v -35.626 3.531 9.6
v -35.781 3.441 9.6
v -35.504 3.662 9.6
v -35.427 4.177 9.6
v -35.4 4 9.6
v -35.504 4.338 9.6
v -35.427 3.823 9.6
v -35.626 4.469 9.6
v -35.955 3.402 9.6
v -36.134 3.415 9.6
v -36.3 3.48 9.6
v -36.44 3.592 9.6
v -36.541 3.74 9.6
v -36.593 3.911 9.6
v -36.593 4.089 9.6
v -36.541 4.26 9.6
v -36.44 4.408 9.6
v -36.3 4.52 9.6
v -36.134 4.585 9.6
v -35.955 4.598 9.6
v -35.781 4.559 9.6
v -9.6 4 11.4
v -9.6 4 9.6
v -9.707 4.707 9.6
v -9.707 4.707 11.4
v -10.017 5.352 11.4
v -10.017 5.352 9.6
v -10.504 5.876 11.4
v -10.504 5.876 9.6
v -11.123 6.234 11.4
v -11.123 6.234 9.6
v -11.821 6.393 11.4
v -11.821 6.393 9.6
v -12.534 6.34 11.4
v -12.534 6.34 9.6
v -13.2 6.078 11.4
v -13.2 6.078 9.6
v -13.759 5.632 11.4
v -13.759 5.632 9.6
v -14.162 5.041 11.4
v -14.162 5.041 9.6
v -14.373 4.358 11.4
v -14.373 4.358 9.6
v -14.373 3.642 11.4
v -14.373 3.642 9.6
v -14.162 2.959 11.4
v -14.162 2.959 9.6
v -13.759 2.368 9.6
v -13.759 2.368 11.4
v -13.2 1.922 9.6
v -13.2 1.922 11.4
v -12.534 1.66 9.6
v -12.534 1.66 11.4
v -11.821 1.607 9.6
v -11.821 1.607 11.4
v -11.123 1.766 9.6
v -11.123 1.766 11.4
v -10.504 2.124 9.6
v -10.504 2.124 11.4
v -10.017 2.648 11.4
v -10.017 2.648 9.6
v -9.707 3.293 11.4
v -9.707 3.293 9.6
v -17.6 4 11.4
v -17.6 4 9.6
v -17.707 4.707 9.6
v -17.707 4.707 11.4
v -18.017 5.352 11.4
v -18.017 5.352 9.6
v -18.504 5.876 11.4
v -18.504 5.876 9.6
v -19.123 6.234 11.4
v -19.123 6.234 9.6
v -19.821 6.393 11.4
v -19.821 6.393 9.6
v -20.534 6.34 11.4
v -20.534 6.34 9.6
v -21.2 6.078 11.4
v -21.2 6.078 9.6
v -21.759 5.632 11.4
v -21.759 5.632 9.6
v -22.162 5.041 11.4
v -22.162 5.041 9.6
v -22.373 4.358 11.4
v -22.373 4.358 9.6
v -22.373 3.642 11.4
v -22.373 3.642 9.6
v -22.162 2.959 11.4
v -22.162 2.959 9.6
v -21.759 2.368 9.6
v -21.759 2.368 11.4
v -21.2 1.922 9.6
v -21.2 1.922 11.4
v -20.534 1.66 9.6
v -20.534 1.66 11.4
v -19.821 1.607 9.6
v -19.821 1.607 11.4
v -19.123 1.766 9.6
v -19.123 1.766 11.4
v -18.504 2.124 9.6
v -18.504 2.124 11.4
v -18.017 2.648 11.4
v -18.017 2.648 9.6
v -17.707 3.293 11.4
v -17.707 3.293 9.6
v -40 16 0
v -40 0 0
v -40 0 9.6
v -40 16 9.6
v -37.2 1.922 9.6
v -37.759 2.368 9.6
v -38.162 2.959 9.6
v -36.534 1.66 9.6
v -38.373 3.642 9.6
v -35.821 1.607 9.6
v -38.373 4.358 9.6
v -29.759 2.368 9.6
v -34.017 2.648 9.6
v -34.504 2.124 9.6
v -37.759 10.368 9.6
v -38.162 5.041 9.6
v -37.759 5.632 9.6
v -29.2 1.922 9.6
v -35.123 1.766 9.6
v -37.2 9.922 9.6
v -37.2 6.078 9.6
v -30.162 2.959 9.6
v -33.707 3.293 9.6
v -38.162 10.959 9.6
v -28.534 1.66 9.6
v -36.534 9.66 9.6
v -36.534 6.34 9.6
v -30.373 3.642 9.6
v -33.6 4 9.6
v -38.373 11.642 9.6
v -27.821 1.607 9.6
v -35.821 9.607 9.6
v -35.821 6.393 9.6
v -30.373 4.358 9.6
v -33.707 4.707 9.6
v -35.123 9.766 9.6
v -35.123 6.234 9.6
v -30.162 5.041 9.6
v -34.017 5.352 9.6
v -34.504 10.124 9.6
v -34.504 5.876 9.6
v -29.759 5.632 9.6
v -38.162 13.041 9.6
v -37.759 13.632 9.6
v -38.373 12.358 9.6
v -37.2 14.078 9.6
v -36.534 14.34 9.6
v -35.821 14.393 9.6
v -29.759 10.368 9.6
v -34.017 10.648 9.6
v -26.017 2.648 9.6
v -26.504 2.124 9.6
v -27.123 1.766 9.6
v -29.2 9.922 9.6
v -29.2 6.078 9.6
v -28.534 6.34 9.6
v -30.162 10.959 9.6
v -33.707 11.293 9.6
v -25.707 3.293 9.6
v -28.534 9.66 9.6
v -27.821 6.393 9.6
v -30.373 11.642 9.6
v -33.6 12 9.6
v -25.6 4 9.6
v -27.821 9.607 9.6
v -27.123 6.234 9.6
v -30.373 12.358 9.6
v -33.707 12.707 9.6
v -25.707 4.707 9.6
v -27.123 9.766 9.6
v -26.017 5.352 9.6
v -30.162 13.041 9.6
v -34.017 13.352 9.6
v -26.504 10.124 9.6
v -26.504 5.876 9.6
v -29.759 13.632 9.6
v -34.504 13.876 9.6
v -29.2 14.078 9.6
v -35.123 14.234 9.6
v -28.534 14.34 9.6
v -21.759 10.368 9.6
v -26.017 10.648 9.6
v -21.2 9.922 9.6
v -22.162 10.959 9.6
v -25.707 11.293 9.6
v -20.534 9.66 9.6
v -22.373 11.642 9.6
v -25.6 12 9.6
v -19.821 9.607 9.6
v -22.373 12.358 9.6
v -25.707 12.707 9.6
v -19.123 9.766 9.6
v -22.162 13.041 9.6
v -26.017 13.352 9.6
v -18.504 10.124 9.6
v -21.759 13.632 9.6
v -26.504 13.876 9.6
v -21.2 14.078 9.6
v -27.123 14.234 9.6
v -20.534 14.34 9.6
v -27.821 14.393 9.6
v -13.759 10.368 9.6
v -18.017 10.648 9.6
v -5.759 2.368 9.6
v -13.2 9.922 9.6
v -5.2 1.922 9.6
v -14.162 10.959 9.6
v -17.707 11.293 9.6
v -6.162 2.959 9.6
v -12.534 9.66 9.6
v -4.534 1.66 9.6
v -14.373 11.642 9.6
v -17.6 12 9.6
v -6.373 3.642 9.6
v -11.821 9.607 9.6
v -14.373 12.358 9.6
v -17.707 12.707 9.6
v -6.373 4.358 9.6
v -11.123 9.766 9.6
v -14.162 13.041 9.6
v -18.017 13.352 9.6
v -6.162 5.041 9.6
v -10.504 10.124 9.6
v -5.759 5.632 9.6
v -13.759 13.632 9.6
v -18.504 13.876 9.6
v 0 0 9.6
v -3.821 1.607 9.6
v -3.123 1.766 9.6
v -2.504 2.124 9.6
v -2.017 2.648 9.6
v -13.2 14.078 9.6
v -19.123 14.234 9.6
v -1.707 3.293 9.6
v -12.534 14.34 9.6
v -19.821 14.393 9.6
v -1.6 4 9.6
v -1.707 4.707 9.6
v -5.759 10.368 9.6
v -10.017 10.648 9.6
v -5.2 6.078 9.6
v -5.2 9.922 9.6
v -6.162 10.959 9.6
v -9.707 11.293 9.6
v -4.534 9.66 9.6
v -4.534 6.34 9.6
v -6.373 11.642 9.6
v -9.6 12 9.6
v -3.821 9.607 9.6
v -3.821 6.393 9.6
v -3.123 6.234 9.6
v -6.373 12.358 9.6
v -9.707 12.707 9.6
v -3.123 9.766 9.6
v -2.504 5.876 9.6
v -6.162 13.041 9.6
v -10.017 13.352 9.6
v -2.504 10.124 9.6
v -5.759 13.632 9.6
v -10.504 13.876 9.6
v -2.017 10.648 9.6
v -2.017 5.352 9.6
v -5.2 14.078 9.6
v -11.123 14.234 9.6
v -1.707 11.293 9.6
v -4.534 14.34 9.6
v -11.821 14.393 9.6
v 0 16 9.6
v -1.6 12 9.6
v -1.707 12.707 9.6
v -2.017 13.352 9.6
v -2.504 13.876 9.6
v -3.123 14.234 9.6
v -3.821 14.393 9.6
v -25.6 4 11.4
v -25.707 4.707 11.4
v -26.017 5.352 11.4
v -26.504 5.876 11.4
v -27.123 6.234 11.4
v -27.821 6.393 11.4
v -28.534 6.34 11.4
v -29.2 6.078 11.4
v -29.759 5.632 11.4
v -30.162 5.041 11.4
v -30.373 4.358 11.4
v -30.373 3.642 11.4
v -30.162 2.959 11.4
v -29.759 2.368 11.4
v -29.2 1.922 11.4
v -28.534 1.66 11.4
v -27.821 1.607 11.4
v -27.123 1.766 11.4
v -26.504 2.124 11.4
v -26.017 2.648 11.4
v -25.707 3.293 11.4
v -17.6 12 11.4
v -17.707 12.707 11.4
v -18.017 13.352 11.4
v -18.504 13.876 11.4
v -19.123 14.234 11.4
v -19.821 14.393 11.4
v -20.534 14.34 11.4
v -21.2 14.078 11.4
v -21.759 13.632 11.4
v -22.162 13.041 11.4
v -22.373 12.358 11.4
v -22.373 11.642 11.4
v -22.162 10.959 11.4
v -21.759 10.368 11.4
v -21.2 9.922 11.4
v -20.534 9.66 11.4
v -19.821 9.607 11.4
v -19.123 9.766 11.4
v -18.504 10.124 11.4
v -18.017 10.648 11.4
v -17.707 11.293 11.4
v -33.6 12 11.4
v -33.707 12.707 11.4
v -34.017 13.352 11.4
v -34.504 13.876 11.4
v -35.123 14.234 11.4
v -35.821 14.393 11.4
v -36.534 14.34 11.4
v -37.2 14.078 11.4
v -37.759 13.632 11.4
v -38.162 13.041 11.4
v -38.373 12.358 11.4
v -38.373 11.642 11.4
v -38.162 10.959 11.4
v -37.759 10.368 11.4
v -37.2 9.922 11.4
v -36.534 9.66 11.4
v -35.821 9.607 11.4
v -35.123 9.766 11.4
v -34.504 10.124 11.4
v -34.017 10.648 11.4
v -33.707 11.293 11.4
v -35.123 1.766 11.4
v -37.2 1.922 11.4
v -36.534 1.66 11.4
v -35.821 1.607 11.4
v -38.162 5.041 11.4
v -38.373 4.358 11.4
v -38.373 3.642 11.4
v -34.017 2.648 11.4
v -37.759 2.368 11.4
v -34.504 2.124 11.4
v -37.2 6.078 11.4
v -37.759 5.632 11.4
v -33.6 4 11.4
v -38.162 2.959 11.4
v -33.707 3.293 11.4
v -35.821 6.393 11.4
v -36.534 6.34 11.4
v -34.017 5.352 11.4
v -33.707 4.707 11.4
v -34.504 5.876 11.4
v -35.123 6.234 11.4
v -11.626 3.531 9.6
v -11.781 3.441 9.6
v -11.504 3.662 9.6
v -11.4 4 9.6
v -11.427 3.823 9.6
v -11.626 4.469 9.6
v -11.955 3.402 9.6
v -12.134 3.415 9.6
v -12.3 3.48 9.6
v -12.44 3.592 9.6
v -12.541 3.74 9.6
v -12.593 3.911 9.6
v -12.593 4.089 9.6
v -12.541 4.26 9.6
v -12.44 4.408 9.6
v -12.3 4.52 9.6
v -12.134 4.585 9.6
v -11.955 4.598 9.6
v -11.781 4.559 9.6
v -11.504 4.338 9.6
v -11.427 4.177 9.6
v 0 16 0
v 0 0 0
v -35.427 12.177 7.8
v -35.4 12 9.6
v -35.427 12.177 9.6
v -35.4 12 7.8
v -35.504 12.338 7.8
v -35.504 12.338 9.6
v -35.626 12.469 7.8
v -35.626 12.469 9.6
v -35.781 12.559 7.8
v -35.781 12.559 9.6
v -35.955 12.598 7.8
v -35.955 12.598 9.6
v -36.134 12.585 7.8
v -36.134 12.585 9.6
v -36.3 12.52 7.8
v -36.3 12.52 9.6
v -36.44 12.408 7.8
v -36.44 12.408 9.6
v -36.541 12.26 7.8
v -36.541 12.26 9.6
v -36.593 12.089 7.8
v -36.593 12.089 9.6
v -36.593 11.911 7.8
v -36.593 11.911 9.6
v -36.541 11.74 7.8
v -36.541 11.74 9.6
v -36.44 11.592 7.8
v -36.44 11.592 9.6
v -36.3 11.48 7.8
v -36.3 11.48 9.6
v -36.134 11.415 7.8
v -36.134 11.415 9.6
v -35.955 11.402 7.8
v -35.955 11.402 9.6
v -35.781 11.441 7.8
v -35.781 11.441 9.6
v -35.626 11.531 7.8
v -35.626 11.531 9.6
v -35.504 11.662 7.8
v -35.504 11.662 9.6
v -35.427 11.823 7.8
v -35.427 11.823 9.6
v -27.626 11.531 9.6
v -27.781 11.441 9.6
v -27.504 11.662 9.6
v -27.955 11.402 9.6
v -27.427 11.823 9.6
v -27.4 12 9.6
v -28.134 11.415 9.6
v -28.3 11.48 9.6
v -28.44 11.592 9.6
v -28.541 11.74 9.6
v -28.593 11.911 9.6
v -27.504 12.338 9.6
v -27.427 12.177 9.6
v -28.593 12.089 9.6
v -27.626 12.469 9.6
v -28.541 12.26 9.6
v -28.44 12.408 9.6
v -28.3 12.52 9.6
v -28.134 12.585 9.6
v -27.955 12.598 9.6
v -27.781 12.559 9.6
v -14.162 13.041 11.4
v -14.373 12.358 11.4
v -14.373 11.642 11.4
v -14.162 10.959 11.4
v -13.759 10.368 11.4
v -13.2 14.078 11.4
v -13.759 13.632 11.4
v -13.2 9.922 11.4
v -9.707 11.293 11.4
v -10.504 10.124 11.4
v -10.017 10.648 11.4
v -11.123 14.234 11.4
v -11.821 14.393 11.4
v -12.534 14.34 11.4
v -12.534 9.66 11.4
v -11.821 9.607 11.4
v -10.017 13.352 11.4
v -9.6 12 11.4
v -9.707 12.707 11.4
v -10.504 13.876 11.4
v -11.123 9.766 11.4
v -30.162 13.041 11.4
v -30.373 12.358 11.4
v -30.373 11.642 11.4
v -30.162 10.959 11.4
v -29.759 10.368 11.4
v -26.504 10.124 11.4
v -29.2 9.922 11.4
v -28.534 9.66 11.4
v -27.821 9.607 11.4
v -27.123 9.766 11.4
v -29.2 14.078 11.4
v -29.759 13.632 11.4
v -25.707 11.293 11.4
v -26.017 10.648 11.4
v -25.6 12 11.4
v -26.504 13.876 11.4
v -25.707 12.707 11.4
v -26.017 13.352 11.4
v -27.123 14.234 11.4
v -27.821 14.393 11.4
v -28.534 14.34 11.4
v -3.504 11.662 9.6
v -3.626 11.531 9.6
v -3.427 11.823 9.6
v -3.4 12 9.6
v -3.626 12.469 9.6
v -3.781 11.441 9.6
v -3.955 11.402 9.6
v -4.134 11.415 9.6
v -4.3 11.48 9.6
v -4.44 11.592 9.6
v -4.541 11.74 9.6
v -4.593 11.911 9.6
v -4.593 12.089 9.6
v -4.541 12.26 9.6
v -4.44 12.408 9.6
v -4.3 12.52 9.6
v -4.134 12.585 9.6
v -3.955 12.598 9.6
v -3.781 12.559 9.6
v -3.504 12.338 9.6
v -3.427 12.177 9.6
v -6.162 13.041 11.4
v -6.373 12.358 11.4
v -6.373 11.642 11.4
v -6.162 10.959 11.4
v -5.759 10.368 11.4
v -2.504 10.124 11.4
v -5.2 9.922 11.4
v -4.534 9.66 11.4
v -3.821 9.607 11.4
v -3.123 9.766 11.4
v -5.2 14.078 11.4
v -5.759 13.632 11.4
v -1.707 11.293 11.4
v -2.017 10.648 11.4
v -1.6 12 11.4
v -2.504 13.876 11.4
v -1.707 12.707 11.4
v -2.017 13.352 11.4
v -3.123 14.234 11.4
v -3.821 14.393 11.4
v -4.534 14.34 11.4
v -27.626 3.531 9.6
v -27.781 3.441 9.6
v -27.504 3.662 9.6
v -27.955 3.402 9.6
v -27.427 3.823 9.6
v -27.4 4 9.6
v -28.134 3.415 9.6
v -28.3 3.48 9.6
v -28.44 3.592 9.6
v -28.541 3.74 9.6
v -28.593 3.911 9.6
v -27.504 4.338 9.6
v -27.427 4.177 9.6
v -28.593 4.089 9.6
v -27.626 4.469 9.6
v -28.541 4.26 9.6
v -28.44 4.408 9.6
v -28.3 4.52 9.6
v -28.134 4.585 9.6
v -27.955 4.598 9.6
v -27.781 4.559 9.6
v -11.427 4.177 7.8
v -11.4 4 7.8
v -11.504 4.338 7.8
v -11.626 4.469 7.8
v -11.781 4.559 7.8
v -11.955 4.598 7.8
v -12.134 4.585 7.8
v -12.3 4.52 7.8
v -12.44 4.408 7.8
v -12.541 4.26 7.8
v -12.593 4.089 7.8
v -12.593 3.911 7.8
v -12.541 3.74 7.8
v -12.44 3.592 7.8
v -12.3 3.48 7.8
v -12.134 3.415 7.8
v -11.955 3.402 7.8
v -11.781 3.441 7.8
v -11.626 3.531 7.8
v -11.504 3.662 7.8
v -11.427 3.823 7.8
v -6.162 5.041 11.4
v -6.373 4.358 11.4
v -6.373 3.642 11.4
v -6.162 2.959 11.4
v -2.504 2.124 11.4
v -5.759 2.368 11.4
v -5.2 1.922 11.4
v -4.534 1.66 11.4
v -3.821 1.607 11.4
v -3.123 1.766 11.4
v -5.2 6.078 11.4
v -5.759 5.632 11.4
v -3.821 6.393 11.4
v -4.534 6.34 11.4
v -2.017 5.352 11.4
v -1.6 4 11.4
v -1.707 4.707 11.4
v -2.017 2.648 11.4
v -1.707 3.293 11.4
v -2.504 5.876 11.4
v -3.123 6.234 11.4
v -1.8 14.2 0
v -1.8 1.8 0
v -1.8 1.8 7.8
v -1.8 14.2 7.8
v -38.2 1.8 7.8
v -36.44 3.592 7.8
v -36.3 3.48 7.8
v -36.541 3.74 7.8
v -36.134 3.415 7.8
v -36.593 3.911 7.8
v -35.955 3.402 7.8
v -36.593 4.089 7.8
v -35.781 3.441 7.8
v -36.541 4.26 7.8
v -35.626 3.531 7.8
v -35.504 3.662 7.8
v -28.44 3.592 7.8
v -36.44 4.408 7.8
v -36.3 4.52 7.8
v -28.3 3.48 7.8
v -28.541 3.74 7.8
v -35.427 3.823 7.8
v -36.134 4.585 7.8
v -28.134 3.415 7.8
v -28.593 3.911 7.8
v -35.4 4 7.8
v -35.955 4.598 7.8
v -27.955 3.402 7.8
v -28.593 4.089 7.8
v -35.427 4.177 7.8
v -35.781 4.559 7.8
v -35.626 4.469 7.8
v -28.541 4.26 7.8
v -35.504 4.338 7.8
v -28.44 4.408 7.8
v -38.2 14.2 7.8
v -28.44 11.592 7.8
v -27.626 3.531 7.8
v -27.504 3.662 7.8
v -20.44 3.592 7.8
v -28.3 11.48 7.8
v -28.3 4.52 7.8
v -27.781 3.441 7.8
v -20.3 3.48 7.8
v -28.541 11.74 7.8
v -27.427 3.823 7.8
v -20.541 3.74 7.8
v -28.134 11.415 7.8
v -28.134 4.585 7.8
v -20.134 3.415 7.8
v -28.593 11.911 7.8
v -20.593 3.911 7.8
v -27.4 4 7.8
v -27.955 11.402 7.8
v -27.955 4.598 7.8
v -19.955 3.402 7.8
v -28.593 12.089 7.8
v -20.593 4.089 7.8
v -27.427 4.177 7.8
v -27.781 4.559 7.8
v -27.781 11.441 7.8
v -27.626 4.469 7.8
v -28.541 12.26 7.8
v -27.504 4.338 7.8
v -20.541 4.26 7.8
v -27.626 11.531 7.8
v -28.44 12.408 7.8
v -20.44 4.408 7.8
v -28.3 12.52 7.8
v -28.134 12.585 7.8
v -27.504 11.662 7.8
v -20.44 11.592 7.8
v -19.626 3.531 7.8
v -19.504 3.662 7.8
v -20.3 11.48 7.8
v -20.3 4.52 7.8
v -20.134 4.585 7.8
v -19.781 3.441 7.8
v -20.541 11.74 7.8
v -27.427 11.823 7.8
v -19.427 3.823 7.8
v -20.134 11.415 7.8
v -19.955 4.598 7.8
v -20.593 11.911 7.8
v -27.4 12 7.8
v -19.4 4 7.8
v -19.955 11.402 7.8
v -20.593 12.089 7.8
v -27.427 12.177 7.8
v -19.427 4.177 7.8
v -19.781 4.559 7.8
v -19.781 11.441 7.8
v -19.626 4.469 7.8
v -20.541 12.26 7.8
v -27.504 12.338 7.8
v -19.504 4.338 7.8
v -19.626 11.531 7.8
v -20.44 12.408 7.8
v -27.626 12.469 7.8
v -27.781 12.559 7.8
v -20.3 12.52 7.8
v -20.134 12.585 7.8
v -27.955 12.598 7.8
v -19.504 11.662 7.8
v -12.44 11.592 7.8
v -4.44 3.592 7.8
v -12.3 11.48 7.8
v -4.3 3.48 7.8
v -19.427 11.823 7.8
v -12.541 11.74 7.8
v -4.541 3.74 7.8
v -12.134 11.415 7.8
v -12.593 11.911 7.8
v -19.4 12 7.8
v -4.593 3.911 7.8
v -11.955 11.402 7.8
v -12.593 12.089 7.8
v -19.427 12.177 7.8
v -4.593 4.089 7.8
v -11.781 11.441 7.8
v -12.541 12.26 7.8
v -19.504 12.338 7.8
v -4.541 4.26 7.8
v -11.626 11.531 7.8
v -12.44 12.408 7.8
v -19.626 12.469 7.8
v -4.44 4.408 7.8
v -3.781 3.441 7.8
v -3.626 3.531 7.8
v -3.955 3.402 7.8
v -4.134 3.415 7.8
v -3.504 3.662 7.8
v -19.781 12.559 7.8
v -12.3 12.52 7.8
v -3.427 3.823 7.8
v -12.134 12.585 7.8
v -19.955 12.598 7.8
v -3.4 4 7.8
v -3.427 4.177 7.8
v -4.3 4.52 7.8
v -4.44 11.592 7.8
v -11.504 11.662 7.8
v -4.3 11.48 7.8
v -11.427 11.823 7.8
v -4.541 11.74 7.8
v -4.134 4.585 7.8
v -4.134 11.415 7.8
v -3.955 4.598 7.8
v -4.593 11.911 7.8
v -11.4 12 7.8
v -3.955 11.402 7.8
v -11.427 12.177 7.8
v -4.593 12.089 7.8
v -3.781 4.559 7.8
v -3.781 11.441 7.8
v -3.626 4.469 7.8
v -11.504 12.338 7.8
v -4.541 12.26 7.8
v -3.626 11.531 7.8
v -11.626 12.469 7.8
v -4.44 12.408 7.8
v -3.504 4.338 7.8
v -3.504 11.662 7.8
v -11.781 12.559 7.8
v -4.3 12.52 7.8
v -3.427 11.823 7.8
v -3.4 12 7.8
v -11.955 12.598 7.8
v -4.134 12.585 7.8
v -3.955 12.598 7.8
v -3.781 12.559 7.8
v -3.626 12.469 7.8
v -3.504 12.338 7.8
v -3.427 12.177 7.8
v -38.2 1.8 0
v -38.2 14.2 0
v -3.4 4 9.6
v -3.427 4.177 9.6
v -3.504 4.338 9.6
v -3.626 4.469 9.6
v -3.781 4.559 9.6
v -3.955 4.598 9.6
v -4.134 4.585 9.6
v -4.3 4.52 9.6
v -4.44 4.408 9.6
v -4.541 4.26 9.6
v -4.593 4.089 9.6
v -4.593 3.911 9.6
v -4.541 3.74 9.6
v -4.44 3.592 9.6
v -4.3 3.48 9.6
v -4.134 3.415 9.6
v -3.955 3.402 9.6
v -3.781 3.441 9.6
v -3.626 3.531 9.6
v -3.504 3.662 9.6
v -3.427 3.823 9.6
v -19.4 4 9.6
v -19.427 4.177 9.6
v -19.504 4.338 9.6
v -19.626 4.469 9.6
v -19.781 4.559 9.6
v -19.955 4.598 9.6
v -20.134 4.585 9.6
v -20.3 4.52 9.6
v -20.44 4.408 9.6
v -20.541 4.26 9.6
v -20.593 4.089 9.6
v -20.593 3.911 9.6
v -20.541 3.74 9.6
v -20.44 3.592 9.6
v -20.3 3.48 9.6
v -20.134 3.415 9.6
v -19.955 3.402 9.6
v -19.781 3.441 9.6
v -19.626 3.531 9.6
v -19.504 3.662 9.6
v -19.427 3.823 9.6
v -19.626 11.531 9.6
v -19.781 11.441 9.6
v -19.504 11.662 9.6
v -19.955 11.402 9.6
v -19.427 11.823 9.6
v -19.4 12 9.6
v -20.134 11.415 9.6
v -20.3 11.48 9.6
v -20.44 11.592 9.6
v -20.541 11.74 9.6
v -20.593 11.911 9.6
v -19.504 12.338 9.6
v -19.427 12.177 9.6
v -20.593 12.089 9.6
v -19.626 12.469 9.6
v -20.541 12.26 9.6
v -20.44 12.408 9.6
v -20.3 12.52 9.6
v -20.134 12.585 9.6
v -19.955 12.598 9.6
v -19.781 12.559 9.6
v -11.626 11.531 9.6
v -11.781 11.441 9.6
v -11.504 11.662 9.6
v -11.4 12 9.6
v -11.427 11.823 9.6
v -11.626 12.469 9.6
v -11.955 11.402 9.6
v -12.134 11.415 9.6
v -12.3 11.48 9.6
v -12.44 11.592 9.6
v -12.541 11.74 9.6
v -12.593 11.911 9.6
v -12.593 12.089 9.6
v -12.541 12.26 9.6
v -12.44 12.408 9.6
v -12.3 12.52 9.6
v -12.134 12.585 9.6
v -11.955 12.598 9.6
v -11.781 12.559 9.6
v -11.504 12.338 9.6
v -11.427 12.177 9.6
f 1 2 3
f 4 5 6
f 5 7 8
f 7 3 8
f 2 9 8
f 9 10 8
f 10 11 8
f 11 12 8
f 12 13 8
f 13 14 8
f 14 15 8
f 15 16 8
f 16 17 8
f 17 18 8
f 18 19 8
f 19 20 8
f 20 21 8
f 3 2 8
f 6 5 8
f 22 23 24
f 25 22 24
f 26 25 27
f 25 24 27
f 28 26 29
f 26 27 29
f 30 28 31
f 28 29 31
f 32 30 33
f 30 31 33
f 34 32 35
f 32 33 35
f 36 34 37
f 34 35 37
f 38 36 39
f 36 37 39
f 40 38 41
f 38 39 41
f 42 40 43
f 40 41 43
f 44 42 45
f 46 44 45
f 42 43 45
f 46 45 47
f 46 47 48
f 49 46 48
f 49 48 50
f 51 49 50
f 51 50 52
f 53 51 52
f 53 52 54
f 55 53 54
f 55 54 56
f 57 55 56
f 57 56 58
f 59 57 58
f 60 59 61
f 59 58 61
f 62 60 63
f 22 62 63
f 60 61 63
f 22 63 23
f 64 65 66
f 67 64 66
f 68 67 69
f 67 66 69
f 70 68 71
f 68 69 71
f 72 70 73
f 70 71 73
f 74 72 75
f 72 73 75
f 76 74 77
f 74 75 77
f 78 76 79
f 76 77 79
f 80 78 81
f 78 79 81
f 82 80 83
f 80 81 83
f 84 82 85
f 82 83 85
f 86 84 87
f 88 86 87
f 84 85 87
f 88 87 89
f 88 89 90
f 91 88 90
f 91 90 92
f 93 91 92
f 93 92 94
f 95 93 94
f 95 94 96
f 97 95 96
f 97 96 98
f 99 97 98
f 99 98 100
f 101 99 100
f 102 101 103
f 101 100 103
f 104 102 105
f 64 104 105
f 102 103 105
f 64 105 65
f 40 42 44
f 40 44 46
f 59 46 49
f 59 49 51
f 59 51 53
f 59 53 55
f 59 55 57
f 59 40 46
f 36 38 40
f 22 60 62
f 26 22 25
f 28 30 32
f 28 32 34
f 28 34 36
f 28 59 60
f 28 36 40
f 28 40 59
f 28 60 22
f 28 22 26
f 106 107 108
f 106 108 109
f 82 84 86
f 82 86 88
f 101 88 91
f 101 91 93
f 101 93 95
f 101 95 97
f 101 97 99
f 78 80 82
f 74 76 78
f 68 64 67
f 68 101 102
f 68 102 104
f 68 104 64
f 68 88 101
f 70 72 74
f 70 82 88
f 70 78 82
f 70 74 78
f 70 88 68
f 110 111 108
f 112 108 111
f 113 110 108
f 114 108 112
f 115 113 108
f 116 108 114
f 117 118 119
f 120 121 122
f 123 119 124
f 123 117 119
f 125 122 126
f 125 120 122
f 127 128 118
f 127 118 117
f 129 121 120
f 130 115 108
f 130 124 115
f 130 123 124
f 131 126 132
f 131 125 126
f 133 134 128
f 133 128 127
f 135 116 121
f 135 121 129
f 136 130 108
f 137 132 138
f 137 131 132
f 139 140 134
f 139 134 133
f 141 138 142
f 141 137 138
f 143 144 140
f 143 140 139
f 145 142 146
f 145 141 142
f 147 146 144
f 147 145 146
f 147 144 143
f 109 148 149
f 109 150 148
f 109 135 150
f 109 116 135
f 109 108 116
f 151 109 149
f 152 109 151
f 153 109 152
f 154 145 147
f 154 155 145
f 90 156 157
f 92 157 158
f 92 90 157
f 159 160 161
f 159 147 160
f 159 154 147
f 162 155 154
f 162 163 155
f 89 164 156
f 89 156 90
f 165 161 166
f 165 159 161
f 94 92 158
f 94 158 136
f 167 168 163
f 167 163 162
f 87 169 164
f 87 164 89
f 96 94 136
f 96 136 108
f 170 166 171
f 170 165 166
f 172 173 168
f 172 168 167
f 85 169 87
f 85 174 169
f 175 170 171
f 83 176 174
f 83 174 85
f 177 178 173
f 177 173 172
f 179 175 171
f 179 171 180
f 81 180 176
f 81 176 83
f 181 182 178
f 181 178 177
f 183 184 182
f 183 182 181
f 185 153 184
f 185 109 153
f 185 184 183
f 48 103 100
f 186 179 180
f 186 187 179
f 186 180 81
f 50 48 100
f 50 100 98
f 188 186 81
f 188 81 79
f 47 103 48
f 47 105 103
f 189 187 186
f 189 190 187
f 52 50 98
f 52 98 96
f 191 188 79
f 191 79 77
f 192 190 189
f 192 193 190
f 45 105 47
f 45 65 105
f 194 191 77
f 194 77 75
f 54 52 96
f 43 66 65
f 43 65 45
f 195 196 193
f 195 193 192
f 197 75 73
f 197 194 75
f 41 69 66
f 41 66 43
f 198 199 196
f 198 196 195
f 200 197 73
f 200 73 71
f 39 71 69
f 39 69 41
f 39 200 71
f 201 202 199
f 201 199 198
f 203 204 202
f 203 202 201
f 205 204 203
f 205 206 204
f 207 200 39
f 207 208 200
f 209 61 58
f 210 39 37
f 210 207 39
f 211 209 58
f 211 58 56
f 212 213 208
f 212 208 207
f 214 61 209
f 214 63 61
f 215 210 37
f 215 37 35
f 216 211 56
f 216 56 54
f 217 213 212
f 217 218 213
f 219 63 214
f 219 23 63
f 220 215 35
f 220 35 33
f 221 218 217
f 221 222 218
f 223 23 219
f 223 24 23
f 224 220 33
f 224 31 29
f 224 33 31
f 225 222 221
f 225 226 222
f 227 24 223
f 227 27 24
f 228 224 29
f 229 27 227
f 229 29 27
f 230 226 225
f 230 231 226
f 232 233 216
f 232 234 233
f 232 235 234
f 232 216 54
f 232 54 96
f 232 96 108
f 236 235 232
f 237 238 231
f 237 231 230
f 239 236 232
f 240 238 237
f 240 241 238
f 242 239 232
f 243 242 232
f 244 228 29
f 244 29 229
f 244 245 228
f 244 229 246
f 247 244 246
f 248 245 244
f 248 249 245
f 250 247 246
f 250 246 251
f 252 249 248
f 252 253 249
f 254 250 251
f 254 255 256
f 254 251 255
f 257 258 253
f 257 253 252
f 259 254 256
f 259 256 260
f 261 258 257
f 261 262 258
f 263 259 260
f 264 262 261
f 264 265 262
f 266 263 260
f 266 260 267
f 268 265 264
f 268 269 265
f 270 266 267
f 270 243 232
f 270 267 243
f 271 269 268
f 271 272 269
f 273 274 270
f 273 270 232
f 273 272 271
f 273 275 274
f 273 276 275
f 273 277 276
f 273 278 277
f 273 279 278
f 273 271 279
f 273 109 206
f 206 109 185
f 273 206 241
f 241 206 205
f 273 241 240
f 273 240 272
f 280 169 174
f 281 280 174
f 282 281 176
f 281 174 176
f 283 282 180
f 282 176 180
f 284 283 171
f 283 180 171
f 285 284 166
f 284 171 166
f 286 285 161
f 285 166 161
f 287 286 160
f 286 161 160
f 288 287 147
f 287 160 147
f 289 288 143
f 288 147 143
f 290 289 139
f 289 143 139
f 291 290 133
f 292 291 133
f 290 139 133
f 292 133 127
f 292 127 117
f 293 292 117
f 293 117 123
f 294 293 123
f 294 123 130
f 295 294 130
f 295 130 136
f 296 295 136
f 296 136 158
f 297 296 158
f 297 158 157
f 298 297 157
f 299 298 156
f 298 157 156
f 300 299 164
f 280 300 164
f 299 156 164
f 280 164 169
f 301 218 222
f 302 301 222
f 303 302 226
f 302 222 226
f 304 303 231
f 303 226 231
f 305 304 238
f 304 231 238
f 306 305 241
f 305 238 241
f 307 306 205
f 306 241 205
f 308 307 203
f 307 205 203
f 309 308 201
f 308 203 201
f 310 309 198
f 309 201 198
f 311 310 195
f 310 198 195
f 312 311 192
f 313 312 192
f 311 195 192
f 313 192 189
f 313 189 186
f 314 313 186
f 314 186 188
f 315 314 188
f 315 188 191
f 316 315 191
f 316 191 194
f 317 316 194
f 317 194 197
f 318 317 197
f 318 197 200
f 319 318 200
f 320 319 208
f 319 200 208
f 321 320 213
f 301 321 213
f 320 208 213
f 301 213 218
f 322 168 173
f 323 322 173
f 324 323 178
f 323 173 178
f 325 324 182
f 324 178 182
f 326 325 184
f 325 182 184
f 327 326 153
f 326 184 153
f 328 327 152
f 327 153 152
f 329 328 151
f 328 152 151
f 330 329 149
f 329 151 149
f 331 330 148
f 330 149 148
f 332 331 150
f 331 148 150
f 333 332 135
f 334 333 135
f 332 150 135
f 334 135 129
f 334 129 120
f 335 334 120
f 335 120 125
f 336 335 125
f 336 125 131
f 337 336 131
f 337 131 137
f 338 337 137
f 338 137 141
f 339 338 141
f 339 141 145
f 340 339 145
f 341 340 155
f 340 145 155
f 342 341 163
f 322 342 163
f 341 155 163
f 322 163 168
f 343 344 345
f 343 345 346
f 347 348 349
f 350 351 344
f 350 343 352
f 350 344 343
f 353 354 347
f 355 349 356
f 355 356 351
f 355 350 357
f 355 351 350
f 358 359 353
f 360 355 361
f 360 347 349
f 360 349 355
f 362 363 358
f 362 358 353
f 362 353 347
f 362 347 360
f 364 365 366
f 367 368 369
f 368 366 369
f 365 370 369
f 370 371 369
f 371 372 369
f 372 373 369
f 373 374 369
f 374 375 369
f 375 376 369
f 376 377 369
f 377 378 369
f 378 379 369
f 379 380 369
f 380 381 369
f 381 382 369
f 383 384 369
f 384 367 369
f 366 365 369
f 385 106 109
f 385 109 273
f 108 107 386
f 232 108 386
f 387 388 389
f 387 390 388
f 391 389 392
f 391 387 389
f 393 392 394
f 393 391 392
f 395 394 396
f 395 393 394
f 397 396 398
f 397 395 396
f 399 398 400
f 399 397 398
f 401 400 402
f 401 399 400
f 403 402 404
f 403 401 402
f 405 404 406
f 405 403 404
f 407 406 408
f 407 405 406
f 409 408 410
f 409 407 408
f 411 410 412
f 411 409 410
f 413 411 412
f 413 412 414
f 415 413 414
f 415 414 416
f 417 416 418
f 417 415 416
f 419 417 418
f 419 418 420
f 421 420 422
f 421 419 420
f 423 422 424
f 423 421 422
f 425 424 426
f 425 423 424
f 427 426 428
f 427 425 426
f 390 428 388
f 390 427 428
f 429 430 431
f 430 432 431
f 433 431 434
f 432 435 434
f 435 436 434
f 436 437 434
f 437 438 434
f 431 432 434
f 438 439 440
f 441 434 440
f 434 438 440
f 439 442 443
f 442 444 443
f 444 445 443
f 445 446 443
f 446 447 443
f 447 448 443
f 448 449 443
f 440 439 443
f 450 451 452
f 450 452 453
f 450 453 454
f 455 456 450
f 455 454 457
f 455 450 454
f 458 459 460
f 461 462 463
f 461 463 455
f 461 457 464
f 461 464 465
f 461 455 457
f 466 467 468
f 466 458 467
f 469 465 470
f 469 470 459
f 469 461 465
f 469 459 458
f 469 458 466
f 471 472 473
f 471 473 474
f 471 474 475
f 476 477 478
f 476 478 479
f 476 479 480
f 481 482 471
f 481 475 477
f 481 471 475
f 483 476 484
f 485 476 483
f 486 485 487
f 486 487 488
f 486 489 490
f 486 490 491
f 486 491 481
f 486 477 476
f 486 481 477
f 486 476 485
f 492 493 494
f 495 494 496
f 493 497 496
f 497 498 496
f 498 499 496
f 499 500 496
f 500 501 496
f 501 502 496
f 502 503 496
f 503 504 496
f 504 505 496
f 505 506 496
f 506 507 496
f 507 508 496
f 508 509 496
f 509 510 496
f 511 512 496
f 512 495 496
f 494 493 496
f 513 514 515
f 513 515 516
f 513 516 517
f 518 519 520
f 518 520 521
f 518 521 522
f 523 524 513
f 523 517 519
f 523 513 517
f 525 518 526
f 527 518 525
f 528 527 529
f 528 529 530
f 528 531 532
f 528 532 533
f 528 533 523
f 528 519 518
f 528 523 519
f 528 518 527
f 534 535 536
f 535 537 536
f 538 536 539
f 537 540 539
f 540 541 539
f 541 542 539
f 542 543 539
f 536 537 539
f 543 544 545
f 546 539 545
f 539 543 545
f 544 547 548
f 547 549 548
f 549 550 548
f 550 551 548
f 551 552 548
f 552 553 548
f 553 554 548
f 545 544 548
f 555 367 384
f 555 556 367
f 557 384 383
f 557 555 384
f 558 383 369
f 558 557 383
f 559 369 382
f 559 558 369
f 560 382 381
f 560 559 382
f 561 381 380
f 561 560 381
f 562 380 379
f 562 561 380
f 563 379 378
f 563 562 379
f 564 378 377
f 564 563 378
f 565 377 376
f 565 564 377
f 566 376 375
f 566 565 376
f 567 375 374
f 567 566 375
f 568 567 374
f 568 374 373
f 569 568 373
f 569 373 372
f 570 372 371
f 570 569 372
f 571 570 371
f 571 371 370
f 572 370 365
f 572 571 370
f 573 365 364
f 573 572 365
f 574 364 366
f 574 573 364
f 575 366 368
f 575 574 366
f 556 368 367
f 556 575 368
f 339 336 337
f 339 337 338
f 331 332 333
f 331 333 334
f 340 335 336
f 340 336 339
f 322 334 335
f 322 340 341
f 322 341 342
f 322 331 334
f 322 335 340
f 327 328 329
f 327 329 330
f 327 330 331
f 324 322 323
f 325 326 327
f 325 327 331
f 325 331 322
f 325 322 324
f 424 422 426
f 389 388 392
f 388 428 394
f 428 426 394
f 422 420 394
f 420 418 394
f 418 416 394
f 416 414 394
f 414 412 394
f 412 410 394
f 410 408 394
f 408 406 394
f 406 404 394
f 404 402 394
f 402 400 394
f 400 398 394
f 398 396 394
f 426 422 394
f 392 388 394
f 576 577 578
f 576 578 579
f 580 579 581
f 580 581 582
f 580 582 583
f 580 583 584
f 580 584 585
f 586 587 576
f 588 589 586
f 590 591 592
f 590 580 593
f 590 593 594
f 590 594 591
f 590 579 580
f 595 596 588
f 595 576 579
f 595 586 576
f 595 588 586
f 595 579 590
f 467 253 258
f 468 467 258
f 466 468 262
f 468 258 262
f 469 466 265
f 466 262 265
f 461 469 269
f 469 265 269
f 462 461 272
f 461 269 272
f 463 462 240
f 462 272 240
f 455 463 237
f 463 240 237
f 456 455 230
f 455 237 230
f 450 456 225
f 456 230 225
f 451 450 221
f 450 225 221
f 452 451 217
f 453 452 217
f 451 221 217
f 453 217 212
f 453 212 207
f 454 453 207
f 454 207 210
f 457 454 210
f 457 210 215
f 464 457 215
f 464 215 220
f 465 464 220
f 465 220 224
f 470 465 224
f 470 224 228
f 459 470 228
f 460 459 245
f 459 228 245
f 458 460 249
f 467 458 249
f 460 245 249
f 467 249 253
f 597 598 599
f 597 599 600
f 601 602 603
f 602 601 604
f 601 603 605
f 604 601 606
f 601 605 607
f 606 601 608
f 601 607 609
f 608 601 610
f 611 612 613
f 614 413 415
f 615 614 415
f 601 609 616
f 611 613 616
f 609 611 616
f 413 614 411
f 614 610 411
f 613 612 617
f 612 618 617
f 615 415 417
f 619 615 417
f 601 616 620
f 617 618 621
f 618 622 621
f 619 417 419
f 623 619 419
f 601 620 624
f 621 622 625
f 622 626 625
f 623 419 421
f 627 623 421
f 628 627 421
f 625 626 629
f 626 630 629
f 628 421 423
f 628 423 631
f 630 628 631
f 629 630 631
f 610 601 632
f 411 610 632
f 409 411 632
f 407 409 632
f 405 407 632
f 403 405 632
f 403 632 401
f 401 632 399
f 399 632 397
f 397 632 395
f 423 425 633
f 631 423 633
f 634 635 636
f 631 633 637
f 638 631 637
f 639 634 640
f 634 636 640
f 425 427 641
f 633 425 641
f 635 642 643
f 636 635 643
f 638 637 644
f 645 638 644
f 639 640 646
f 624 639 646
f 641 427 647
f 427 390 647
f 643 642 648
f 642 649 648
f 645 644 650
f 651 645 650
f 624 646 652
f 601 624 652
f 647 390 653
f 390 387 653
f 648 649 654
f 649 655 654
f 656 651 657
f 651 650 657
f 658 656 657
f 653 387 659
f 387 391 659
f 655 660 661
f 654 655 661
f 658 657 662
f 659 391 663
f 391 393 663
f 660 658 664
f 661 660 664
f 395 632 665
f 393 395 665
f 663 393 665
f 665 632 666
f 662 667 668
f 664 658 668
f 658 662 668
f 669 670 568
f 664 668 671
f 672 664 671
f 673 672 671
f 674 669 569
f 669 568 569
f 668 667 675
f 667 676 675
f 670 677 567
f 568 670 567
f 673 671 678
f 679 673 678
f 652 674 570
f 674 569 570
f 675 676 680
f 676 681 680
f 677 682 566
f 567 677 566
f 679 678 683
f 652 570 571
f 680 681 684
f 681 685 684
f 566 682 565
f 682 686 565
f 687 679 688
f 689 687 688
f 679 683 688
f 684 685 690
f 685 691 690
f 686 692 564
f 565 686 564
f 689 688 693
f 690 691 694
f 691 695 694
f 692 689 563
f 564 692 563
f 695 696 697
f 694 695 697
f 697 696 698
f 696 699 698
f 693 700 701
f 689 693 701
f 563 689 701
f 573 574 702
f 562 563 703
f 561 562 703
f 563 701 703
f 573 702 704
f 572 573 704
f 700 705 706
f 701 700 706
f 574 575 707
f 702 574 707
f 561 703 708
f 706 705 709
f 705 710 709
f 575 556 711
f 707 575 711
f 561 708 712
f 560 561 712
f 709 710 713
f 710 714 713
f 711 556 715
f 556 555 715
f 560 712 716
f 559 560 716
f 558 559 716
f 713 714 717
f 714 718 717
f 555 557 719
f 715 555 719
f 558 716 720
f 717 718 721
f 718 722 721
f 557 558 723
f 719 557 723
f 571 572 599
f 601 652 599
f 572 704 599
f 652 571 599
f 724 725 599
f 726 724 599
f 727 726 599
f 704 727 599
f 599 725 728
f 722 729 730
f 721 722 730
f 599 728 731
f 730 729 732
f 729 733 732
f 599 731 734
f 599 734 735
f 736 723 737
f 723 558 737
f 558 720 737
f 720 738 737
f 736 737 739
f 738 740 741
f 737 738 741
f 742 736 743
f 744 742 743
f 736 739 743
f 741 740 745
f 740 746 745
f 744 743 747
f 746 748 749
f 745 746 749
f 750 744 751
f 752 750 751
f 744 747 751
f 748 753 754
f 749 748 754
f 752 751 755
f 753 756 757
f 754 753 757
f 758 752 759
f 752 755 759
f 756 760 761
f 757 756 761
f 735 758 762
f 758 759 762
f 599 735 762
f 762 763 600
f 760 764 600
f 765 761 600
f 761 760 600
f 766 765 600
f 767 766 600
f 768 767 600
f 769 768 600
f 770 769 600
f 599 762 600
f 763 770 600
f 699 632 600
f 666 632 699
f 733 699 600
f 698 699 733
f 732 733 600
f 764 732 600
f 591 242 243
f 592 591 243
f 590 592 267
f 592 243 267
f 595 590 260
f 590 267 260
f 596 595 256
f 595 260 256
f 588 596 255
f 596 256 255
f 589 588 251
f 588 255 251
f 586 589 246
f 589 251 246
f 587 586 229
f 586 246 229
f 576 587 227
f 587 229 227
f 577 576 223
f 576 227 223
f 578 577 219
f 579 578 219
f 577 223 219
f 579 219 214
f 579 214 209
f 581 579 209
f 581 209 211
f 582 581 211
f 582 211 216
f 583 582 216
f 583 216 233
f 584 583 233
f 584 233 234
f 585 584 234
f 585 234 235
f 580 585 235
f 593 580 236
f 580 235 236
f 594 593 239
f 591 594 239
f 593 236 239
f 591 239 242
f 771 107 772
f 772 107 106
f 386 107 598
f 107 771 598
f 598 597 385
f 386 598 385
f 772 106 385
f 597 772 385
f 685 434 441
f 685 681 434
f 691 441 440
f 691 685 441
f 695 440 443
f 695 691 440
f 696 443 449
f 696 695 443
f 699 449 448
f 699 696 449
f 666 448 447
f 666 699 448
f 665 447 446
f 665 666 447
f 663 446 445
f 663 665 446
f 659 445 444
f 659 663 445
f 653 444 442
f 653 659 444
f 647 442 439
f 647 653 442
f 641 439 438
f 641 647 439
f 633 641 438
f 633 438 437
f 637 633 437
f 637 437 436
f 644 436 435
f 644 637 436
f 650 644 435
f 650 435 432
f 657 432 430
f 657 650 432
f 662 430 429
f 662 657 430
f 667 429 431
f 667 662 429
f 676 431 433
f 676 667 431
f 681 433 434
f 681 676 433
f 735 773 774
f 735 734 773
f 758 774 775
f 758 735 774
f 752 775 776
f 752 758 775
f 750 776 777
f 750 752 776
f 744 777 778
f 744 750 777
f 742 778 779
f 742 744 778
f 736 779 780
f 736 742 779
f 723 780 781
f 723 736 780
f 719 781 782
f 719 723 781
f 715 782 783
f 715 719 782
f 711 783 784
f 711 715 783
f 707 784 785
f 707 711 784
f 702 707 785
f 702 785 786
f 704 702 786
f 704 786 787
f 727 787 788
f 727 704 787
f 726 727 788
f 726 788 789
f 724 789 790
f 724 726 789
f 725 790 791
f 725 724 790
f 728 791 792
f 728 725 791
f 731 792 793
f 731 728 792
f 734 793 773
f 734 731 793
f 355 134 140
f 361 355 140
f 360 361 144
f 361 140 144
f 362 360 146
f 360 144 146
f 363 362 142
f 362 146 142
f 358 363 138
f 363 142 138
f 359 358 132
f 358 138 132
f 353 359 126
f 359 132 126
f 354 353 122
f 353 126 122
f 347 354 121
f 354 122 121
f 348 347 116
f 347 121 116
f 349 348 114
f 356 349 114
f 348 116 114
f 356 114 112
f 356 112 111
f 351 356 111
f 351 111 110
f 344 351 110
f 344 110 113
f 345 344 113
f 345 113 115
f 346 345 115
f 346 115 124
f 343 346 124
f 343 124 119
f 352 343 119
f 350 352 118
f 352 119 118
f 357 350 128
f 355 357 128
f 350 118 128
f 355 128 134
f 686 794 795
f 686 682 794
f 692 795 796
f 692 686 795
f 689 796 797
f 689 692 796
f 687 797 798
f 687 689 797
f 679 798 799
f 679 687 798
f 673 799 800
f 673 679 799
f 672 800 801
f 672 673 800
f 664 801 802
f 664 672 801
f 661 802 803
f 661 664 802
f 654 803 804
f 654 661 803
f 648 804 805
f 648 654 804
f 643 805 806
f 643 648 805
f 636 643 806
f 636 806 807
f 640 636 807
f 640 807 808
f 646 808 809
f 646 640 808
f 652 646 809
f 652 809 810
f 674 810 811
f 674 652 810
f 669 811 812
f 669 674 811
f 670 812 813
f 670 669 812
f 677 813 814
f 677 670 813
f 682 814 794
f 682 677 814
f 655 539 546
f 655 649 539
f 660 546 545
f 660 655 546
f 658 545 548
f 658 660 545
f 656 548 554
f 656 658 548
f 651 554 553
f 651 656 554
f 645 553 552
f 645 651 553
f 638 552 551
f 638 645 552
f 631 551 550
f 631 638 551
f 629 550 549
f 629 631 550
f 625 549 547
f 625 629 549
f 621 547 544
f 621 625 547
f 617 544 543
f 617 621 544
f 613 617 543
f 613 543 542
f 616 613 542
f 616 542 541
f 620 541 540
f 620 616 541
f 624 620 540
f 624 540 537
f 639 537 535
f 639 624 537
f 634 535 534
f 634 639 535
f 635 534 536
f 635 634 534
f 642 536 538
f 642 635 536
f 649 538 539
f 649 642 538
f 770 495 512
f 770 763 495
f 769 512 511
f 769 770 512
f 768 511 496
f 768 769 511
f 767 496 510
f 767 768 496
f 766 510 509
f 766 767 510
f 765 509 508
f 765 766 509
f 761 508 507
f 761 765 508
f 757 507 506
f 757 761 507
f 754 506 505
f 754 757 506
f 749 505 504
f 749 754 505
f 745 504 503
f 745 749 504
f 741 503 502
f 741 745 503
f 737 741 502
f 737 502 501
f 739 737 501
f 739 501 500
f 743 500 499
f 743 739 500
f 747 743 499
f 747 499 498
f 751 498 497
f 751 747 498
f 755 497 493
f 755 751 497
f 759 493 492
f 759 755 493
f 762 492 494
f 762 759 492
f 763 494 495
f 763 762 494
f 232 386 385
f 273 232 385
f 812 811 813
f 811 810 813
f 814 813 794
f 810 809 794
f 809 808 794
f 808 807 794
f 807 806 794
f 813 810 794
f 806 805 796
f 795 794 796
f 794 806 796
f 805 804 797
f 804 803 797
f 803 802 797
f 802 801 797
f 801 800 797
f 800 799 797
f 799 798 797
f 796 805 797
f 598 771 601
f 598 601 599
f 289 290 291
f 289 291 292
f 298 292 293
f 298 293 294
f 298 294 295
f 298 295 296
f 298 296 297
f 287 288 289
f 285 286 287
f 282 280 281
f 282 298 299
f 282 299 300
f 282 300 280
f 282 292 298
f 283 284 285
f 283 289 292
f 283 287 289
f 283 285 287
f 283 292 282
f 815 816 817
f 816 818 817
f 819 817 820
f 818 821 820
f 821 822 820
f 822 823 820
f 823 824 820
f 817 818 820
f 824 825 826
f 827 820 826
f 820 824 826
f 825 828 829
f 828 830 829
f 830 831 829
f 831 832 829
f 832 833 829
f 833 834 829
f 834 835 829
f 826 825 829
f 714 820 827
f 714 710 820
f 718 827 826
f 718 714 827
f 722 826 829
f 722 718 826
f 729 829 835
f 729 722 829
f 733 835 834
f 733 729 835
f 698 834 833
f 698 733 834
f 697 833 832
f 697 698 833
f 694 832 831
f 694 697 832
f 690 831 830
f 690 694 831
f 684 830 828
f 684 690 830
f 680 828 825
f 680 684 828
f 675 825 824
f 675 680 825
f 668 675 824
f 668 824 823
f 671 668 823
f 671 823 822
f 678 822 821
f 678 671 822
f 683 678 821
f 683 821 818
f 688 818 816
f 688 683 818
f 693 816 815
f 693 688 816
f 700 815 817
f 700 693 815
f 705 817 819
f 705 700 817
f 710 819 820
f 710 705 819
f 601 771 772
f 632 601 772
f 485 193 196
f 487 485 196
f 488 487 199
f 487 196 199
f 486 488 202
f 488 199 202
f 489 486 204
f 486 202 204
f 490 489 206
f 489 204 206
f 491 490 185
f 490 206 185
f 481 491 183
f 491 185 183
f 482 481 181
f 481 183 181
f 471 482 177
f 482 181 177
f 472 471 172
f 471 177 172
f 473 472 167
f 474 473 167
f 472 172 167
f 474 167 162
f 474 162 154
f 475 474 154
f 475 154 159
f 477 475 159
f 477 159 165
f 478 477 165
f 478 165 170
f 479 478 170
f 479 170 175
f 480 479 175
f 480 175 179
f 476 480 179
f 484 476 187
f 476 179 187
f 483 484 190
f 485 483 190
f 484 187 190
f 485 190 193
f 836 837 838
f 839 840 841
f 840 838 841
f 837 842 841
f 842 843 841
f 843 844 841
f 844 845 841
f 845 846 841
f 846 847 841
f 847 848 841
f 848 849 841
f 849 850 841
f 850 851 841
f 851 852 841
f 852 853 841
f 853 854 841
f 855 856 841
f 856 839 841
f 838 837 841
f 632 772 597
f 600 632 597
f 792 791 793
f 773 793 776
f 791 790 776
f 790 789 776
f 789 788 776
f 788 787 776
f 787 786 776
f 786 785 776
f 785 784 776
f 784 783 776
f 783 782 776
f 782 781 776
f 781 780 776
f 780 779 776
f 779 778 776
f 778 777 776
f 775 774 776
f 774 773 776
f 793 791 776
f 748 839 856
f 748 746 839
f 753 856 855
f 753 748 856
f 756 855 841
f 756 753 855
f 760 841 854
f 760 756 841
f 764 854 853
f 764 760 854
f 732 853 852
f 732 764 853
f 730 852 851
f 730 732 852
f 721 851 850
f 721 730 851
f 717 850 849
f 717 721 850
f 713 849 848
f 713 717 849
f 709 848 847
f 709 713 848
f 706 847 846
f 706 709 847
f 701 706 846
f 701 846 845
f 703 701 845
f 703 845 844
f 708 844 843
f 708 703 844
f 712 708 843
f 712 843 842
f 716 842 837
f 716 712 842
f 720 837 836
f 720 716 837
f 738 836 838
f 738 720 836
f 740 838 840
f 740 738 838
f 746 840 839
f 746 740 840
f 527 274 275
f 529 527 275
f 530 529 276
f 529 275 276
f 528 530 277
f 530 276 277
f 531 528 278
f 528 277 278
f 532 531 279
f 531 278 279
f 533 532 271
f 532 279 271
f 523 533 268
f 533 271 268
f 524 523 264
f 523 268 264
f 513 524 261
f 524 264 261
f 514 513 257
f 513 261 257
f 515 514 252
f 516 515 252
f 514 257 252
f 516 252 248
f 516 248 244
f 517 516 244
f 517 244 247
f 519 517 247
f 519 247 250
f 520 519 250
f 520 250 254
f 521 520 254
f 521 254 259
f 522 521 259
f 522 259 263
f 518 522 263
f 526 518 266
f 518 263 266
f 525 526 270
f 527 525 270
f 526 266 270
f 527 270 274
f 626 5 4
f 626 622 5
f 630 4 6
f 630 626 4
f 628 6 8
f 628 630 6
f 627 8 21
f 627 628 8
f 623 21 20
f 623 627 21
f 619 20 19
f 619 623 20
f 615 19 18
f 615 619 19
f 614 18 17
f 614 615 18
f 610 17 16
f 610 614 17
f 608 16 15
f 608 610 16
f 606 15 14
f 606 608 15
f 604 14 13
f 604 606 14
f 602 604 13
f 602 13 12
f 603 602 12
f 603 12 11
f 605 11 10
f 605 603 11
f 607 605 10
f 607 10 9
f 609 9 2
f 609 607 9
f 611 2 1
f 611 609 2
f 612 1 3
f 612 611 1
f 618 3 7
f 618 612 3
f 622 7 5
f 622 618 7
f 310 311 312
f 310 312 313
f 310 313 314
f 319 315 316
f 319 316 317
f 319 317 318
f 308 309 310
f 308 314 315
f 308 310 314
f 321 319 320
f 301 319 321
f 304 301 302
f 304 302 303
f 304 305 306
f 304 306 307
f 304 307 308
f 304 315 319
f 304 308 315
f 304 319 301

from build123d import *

# Parameters (mm, degrees)
F0_W     = 40
F0_H     = 16
F1_DEPTH = 9.6
F2_R     = 2.4
F3_DEPTH = 1.8
F4_T     = -1.8


with BuildPart() as f1:
    # F0 (on Top) → F1 (new body)
    with BuildSketch(Plane.XY):
        with Locations((-20, 8)):
            Rectangle(F0_W, F0_H)
    extrude(amount=F1_DEPTH)

    # F2 (on face) → F3 (join)
    with BuildSketch(Plane.XY.offset(9.6)):
        with Locations((-36, 12)):
            Circle(F2_R)
        with Locations((-36, 4)):
            Circle(F2_R)
        with Locations((-28, 4)):
            Circle(F2_R)
        with Locations((-28, 12)):
            Circle(F2_R)
        with Locations((-20, 4)):
            Circle(F2_R)
        with Locations((-12, 4)):
            Circle(F2_R)
        with Locations((-4, 4)):
            Circle(F2_R)
        with Locations((-4, 12)):
            Circle(F2_R)
        with Locations((-12, 12)):
            Circle(F2_R)
        with Locations((-20, 12)):
            Circle(F2_R)
    extrude(amount=F3_DEPTH)

    # F4
    f4_openings = [f1.faces().sort_by_distance(p)[0] for p in [
        (-20, 8, 0),
    ]]
    offset(amount=F4_T, openings=f4_openings, kind=Kind.INTERSECTION)


solid = f1.part
